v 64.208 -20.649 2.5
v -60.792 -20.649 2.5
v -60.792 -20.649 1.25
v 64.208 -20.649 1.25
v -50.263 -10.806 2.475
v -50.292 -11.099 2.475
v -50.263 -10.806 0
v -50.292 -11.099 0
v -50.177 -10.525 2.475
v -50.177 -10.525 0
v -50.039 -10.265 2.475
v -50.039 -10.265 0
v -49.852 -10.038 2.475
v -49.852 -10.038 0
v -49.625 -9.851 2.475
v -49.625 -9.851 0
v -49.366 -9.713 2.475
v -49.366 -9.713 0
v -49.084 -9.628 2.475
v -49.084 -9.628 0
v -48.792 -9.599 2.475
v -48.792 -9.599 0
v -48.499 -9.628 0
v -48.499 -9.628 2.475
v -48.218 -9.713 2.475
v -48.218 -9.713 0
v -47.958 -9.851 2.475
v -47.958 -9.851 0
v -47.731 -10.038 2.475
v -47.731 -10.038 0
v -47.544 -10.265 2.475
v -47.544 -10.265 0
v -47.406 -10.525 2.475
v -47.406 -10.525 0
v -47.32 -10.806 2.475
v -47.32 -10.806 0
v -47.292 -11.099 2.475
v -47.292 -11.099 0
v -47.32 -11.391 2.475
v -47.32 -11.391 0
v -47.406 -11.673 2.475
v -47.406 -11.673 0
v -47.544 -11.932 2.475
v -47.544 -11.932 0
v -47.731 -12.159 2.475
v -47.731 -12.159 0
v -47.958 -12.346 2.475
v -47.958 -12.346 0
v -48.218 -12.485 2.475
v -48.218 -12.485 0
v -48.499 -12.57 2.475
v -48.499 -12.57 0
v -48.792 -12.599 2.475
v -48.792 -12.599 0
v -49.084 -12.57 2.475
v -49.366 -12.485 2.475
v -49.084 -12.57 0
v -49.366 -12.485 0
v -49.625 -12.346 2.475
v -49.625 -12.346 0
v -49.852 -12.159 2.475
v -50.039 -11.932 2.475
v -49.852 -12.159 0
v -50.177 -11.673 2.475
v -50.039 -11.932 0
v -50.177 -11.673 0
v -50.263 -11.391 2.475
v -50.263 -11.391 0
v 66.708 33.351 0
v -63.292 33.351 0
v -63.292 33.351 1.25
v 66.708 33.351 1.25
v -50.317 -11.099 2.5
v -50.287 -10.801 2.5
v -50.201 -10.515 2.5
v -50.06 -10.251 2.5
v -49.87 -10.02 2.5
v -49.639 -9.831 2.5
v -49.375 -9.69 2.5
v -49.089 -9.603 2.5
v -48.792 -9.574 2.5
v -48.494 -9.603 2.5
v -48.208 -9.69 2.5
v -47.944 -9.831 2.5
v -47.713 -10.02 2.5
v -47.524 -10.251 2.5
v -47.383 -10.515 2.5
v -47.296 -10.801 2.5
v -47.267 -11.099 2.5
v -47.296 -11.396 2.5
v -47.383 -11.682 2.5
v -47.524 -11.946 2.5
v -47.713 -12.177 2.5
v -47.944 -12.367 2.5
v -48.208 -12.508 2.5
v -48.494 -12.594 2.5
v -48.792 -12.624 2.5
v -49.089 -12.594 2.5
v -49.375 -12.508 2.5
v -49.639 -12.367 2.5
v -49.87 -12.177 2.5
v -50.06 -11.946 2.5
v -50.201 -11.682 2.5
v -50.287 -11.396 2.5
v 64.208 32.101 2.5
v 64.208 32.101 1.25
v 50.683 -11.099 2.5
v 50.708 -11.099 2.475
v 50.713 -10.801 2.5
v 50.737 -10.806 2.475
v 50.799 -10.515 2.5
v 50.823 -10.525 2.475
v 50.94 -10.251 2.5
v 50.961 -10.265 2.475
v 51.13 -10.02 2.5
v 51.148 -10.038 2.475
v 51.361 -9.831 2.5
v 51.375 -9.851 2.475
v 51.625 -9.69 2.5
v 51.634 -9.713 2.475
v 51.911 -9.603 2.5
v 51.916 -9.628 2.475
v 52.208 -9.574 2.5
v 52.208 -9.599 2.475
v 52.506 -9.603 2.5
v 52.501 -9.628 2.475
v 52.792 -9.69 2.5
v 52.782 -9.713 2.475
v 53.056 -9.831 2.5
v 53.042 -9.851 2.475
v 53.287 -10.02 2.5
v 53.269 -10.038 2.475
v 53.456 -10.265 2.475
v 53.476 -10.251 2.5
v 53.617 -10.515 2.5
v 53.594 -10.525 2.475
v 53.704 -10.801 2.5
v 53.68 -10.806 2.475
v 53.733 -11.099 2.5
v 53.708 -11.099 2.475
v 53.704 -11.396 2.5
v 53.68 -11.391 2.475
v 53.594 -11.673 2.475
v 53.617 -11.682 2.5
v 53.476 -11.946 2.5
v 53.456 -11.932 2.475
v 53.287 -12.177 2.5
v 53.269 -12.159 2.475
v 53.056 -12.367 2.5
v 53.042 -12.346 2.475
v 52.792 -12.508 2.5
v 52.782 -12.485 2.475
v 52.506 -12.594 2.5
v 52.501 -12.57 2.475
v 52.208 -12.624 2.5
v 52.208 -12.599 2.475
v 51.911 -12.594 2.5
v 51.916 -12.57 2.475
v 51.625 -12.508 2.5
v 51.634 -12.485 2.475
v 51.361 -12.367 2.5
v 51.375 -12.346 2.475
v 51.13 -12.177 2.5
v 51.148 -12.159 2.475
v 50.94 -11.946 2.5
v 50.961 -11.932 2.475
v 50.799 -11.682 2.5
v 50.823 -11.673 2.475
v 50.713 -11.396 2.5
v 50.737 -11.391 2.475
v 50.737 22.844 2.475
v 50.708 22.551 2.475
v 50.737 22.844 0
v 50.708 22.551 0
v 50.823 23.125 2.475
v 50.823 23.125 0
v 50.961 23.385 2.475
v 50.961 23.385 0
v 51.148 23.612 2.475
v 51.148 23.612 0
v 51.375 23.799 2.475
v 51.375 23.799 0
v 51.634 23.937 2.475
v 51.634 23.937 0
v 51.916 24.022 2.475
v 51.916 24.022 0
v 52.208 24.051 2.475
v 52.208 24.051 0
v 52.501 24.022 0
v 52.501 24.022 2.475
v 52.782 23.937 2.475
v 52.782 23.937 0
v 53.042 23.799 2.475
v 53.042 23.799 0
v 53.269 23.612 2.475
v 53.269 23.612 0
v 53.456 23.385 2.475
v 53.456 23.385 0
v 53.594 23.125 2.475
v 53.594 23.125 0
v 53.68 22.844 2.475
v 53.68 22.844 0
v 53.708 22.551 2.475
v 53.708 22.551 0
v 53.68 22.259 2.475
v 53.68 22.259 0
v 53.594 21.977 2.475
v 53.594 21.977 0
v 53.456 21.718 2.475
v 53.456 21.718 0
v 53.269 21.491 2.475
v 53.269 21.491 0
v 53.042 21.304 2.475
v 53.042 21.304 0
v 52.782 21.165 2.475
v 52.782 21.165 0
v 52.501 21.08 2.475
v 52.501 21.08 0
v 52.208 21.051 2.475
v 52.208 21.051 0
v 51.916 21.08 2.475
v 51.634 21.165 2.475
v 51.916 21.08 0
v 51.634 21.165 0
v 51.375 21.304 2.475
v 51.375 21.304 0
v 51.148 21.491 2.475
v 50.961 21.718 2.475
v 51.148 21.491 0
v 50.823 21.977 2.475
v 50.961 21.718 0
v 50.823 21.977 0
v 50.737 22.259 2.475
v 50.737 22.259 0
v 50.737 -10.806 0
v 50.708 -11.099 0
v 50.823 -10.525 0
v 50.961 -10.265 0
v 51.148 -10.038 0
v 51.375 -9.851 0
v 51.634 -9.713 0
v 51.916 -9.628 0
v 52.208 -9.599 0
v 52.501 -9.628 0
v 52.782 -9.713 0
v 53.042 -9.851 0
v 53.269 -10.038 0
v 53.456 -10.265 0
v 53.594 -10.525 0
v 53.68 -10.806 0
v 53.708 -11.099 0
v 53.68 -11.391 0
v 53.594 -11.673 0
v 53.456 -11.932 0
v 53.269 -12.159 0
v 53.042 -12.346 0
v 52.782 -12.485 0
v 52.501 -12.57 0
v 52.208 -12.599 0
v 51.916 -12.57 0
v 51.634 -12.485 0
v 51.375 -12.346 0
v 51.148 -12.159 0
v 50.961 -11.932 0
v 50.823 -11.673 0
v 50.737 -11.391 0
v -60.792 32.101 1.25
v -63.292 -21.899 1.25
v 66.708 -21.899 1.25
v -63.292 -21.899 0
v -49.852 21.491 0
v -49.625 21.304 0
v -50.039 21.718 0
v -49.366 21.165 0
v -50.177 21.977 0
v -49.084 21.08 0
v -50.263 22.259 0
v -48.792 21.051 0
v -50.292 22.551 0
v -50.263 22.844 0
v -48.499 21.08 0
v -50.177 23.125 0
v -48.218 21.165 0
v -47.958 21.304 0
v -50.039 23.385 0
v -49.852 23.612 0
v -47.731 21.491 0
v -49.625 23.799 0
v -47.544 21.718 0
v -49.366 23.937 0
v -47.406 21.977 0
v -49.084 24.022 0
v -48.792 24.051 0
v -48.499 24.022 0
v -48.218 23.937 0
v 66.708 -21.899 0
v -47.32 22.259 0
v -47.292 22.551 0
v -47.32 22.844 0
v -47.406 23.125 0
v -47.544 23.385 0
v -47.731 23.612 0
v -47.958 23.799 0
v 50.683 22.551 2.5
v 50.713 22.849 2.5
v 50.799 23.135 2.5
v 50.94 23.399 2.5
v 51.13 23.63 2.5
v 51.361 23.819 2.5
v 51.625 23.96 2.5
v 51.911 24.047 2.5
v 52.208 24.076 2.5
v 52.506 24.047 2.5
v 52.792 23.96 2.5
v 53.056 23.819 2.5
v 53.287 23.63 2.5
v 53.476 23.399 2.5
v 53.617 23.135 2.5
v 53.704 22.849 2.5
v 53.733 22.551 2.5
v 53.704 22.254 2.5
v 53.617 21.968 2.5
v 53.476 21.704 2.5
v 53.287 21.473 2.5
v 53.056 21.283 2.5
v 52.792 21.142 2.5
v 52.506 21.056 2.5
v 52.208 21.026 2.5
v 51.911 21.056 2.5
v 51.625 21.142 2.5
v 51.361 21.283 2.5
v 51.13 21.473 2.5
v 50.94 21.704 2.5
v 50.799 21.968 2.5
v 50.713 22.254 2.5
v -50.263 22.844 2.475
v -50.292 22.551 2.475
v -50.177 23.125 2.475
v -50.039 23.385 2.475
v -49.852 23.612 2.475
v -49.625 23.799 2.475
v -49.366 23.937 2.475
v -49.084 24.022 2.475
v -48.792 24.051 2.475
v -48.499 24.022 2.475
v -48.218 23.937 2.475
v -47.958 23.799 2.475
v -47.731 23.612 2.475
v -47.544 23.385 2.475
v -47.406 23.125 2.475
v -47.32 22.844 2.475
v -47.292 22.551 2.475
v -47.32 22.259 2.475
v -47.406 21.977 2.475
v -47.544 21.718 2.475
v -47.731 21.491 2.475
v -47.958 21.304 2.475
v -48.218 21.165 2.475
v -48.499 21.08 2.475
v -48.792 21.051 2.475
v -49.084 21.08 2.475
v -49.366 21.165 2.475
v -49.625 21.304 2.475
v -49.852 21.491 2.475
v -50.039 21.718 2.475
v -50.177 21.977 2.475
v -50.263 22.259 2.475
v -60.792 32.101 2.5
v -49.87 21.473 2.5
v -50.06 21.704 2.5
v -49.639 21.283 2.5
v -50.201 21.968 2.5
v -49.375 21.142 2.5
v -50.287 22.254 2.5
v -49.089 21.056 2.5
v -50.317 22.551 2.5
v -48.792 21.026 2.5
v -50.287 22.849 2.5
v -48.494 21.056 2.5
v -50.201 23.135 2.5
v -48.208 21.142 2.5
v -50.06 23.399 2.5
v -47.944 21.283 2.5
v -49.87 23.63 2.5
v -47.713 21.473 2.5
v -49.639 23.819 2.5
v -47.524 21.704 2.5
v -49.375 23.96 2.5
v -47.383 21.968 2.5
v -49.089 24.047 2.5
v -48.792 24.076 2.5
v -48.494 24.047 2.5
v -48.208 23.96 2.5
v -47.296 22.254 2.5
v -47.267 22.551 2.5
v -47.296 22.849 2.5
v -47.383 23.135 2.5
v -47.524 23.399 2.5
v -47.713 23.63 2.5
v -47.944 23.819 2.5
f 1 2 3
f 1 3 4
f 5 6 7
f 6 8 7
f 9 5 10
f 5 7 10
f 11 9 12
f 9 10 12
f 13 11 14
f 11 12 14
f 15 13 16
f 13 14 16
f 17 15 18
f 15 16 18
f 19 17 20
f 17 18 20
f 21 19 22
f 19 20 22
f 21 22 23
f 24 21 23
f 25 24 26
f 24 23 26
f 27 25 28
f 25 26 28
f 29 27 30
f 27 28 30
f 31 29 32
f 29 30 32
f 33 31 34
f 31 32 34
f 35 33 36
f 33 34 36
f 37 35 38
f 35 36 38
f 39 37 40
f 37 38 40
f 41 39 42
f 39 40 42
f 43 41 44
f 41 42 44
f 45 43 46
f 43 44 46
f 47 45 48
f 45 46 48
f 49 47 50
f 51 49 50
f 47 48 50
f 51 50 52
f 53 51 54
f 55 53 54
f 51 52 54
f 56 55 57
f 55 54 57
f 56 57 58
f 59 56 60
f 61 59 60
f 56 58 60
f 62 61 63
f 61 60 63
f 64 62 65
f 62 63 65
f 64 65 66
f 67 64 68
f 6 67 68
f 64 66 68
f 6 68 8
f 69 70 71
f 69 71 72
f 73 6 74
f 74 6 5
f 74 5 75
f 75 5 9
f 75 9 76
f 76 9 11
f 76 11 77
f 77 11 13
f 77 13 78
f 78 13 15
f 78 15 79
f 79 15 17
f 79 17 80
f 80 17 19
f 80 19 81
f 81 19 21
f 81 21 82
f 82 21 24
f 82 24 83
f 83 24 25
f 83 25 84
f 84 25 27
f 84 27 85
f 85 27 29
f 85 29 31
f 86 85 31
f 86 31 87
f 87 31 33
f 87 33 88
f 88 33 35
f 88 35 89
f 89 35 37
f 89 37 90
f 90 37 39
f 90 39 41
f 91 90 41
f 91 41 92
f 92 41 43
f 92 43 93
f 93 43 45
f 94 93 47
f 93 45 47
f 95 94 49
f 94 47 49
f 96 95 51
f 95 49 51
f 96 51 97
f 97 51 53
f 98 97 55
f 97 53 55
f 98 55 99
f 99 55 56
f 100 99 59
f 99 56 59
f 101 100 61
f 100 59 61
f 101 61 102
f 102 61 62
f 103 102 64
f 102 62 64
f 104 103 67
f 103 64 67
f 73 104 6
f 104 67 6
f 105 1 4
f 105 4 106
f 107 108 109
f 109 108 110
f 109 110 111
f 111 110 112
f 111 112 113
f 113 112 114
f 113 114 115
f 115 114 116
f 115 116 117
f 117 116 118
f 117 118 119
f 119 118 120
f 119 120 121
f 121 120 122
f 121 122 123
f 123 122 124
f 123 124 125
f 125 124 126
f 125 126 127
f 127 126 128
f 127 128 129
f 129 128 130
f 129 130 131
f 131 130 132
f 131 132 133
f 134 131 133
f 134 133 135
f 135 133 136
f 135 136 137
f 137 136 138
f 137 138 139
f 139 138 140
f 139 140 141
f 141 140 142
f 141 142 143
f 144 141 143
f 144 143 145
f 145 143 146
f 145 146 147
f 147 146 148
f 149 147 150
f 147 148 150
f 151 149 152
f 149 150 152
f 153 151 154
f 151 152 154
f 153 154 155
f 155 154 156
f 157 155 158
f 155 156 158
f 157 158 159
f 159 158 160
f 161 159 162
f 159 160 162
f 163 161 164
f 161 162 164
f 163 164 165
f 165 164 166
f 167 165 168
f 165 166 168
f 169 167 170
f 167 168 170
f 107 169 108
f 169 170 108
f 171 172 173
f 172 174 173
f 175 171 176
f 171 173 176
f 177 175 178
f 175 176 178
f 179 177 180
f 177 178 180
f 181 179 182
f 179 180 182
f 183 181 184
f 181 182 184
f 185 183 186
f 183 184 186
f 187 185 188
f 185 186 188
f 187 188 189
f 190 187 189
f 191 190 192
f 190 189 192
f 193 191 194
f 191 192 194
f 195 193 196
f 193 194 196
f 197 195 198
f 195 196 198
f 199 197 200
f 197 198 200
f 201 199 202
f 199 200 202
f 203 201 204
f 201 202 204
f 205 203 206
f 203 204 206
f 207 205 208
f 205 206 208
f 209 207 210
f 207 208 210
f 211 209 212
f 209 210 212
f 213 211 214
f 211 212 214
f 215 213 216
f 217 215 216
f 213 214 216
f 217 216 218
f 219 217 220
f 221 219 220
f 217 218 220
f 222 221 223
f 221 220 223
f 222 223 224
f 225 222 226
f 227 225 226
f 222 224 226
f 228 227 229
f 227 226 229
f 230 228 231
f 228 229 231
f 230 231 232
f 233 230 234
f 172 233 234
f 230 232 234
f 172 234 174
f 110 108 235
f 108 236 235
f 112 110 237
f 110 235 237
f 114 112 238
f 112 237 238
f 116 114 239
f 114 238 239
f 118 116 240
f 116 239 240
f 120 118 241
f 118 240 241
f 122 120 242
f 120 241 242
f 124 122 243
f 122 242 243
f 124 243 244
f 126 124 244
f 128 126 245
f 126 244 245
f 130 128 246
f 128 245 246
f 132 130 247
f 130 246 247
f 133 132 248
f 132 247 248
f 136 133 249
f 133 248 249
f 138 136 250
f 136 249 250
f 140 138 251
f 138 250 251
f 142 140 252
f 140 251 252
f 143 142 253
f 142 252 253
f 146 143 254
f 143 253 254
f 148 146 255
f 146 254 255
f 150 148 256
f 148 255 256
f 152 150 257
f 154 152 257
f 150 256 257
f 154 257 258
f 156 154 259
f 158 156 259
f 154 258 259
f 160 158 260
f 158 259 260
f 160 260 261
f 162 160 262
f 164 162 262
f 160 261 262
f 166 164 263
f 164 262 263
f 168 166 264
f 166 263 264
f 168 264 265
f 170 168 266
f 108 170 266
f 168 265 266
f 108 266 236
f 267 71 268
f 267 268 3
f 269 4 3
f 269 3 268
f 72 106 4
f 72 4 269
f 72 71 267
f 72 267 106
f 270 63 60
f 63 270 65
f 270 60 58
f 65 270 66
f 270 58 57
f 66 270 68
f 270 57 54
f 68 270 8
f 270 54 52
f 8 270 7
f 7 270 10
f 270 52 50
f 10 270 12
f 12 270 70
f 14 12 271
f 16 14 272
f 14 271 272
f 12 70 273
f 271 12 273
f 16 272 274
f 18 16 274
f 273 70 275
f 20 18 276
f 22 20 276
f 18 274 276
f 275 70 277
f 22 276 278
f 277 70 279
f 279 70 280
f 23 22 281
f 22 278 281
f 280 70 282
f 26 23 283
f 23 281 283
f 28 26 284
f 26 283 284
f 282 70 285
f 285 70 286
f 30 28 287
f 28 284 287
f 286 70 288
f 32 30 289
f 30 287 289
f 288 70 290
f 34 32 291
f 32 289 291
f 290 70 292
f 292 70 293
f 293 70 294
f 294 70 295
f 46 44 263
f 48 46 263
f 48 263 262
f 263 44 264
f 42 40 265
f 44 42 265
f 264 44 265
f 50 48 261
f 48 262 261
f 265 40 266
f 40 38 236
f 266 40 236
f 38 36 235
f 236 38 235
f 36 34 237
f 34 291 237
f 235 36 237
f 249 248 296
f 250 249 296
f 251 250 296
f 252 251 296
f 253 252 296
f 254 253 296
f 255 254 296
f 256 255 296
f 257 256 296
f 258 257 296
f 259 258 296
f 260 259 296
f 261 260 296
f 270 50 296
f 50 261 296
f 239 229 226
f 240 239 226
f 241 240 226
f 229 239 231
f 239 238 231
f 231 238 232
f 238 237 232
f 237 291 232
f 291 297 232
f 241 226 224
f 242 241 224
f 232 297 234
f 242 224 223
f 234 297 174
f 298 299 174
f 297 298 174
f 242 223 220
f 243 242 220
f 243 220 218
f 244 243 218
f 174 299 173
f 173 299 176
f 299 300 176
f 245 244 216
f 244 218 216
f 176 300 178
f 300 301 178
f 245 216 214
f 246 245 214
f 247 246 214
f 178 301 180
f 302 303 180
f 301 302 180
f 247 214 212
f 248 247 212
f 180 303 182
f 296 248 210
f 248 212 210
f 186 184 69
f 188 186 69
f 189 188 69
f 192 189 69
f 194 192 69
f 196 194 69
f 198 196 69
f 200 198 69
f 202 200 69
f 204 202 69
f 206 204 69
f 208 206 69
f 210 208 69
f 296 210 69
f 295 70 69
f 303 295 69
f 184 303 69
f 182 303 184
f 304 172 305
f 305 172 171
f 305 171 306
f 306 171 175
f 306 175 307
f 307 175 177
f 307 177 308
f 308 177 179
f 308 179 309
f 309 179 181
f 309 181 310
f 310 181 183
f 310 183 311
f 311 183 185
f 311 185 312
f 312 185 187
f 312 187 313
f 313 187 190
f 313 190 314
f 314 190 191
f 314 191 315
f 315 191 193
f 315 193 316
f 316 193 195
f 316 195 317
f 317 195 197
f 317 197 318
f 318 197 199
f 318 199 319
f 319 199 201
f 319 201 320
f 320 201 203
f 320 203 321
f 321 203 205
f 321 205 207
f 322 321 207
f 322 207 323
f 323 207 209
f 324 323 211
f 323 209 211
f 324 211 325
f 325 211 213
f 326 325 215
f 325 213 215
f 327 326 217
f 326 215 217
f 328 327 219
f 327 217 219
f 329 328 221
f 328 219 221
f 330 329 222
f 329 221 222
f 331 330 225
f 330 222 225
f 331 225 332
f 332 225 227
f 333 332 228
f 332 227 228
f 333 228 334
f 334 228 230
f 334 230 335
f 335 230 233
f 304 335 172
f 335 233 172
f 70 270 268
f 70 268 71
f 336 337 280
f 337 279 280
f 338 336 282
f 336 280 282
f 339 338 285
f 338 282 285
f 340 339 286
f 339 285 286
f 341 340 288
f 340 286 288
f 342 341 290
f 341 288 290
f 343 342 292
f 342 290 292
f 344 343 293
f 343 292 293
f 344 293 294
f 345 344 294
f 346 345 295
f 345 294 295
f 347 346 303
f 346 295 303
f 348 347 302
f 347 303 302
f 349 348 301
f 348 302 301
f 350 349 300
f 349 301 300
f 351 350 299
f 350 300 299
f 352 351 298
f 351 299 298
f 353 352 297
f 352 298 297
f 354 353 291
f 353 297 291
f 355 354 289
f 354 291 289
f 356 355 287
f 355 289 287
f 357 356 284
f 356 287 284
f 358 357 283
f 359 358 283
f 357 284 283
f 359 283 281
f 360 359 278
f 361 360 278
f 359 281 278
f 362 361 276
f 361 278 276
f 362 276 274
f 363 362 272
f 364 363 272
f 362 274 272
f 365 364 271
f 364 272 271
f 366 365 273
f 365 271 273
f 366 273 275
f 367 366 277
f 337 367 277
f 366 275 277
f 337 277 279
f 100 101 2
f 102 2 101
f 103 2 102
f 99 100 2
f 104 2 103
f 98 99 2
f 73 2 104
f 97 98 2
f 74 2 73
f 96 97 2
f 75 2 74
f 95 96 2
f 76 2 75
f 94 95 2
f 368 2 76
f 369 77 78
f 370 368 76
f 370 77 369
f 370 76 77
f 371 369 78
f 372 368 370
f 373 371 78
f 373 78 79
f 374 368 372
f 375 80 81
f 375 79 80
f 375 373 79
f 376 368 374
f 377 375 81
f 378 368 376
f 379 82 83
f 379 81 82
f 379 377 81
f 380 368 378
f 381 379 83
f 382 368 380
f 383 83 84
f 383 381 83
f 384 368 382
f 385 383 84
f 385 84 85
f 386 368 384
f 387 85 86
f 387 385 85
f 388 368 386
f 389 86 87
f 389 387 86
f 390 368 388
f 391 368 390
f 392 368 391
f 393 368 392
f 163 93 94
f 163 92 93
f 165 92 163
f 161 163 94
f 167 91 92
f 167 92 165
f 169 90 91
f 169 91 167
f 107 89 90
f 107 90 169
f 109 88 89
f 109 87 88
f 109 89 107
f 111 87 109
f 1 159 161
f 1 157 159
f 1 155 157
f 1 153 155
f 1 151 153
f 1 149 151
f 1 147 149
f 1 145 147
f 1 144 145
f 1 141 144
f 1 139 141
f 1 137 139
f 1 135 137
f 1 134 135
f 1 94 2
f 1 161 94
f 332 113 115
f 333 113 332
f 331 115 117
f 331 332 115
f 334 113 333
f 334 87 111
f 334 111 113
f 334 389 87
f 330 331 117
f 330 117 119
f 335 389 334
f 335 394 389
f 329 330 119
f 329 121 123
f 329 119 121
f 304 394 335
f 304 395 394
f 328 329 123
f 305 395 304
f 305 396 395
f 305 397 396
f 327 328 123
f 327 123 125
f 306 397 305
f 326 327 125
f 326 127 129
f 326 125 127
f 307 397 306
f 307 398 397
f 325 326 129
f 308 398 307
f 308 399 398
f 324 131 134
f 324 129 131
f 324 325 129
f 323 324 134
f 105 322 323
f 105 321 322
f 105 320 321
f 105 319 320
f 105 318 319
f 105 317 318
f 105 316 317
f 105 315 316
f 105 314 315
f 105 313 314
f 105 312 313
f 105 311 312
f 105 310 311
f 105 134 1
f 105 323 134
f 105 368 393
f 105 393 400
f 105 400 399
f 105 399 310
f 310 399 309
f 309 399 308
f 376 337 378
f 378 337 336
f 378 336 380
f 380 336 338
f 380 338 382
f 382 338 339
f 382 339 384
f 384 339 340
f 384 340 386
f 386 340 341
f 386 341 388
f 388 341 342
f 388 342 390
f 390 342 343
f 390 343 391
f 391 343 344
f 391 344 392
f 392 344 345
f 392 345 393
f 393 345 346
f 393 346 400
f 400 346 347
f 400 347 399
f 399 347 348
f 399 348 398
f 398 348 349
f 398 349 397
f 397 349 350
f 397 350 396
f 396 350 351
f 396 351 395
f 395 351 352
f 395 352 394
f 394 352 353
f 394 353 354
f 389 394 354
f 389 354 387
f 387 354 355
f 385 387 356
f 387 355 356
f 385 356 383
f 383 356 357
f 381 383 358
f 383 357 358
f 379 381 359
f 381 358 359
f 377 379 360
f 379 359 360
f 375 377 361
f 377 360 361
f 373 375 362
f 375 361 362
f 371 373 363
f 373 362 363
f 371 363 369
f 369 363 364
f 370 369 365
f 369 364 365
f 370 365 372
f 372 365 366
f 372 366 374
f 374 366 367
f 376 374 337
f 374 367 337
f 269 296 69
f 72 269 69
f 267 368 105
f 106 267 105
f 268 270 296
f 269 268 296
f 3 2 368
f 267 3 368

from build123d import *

# Parameters (mm, degrees)
ESBO_O1_W                         = 130
ESBO_O1_H                         = 55.25
RESSALTO_EXTRUS_O1_DEPTH          = 2.5
ESBO_O2_W                         = 130
ESBO_O2_H                         = 55.25
ESBO_O2_W_2                       = 125
ESBO_O2_H_2                       = 52.75
CORTE_EXTRUS_O1_DEPTH             = 1.25
FUROS_GUIA_COM_3_0MM2_D           = 3
FUROS_GUIA_COM_3_0MM2_CSINK_D     = 3.05
FUROS_GUIA_COM_3_0MM2_CSINK_ANGLE = 90


with BuildPart() as part:
    # Esboço1 → Ressalto-extrusão1 (new body)
    with BuildSketch(Plane.XY):
        with Locations((1.708397535, 5.726309707)):
            Rectangle(ESBO_O1_W, ESBO_O1_H)
    extrude(amount=RESSALTO_EXTRUS_O1_DEPTH)

    # Esboço2 → Corte-extrusão1 (cut)
    with BuildSketch(Plane.XY.offset(2.5)):
        with Locations((1.708397535, 5.726309707)):
            Rectangle(ESBO_O2_W, ESBO_O2_H)
        with Locations((1.708397535, 5.726309707)):
            Rectangle(ESBO_O2_W_2, ESBO_O2_H_2, mode=Mode.SUBTRACT)
    extrude(amount=-CORTE_EXTRUS_O1_DEPTH, mode=Mode.SUBTRACT)

    # Furos-guia com Ø3.0mm2 (through all)
    with Locations(Plane.XY.offset(2.5)):
        with Locations((-48.791602465, 22.551309707), (-48.791602465, -11.098690293), (52.208397535, -11.098690293), (52.208397535, 22.551309707)):
            CounterSinkHole(FUROS_GUIA_COM_3_0MM2_D / 2, FUROS_GUIA_COM_3_0MM2_CSINK_D / 2, counter_sink_angle=FUROS_GUIA_COM_3_0MM2_CSINK_ANGLE)


solid = part.part
